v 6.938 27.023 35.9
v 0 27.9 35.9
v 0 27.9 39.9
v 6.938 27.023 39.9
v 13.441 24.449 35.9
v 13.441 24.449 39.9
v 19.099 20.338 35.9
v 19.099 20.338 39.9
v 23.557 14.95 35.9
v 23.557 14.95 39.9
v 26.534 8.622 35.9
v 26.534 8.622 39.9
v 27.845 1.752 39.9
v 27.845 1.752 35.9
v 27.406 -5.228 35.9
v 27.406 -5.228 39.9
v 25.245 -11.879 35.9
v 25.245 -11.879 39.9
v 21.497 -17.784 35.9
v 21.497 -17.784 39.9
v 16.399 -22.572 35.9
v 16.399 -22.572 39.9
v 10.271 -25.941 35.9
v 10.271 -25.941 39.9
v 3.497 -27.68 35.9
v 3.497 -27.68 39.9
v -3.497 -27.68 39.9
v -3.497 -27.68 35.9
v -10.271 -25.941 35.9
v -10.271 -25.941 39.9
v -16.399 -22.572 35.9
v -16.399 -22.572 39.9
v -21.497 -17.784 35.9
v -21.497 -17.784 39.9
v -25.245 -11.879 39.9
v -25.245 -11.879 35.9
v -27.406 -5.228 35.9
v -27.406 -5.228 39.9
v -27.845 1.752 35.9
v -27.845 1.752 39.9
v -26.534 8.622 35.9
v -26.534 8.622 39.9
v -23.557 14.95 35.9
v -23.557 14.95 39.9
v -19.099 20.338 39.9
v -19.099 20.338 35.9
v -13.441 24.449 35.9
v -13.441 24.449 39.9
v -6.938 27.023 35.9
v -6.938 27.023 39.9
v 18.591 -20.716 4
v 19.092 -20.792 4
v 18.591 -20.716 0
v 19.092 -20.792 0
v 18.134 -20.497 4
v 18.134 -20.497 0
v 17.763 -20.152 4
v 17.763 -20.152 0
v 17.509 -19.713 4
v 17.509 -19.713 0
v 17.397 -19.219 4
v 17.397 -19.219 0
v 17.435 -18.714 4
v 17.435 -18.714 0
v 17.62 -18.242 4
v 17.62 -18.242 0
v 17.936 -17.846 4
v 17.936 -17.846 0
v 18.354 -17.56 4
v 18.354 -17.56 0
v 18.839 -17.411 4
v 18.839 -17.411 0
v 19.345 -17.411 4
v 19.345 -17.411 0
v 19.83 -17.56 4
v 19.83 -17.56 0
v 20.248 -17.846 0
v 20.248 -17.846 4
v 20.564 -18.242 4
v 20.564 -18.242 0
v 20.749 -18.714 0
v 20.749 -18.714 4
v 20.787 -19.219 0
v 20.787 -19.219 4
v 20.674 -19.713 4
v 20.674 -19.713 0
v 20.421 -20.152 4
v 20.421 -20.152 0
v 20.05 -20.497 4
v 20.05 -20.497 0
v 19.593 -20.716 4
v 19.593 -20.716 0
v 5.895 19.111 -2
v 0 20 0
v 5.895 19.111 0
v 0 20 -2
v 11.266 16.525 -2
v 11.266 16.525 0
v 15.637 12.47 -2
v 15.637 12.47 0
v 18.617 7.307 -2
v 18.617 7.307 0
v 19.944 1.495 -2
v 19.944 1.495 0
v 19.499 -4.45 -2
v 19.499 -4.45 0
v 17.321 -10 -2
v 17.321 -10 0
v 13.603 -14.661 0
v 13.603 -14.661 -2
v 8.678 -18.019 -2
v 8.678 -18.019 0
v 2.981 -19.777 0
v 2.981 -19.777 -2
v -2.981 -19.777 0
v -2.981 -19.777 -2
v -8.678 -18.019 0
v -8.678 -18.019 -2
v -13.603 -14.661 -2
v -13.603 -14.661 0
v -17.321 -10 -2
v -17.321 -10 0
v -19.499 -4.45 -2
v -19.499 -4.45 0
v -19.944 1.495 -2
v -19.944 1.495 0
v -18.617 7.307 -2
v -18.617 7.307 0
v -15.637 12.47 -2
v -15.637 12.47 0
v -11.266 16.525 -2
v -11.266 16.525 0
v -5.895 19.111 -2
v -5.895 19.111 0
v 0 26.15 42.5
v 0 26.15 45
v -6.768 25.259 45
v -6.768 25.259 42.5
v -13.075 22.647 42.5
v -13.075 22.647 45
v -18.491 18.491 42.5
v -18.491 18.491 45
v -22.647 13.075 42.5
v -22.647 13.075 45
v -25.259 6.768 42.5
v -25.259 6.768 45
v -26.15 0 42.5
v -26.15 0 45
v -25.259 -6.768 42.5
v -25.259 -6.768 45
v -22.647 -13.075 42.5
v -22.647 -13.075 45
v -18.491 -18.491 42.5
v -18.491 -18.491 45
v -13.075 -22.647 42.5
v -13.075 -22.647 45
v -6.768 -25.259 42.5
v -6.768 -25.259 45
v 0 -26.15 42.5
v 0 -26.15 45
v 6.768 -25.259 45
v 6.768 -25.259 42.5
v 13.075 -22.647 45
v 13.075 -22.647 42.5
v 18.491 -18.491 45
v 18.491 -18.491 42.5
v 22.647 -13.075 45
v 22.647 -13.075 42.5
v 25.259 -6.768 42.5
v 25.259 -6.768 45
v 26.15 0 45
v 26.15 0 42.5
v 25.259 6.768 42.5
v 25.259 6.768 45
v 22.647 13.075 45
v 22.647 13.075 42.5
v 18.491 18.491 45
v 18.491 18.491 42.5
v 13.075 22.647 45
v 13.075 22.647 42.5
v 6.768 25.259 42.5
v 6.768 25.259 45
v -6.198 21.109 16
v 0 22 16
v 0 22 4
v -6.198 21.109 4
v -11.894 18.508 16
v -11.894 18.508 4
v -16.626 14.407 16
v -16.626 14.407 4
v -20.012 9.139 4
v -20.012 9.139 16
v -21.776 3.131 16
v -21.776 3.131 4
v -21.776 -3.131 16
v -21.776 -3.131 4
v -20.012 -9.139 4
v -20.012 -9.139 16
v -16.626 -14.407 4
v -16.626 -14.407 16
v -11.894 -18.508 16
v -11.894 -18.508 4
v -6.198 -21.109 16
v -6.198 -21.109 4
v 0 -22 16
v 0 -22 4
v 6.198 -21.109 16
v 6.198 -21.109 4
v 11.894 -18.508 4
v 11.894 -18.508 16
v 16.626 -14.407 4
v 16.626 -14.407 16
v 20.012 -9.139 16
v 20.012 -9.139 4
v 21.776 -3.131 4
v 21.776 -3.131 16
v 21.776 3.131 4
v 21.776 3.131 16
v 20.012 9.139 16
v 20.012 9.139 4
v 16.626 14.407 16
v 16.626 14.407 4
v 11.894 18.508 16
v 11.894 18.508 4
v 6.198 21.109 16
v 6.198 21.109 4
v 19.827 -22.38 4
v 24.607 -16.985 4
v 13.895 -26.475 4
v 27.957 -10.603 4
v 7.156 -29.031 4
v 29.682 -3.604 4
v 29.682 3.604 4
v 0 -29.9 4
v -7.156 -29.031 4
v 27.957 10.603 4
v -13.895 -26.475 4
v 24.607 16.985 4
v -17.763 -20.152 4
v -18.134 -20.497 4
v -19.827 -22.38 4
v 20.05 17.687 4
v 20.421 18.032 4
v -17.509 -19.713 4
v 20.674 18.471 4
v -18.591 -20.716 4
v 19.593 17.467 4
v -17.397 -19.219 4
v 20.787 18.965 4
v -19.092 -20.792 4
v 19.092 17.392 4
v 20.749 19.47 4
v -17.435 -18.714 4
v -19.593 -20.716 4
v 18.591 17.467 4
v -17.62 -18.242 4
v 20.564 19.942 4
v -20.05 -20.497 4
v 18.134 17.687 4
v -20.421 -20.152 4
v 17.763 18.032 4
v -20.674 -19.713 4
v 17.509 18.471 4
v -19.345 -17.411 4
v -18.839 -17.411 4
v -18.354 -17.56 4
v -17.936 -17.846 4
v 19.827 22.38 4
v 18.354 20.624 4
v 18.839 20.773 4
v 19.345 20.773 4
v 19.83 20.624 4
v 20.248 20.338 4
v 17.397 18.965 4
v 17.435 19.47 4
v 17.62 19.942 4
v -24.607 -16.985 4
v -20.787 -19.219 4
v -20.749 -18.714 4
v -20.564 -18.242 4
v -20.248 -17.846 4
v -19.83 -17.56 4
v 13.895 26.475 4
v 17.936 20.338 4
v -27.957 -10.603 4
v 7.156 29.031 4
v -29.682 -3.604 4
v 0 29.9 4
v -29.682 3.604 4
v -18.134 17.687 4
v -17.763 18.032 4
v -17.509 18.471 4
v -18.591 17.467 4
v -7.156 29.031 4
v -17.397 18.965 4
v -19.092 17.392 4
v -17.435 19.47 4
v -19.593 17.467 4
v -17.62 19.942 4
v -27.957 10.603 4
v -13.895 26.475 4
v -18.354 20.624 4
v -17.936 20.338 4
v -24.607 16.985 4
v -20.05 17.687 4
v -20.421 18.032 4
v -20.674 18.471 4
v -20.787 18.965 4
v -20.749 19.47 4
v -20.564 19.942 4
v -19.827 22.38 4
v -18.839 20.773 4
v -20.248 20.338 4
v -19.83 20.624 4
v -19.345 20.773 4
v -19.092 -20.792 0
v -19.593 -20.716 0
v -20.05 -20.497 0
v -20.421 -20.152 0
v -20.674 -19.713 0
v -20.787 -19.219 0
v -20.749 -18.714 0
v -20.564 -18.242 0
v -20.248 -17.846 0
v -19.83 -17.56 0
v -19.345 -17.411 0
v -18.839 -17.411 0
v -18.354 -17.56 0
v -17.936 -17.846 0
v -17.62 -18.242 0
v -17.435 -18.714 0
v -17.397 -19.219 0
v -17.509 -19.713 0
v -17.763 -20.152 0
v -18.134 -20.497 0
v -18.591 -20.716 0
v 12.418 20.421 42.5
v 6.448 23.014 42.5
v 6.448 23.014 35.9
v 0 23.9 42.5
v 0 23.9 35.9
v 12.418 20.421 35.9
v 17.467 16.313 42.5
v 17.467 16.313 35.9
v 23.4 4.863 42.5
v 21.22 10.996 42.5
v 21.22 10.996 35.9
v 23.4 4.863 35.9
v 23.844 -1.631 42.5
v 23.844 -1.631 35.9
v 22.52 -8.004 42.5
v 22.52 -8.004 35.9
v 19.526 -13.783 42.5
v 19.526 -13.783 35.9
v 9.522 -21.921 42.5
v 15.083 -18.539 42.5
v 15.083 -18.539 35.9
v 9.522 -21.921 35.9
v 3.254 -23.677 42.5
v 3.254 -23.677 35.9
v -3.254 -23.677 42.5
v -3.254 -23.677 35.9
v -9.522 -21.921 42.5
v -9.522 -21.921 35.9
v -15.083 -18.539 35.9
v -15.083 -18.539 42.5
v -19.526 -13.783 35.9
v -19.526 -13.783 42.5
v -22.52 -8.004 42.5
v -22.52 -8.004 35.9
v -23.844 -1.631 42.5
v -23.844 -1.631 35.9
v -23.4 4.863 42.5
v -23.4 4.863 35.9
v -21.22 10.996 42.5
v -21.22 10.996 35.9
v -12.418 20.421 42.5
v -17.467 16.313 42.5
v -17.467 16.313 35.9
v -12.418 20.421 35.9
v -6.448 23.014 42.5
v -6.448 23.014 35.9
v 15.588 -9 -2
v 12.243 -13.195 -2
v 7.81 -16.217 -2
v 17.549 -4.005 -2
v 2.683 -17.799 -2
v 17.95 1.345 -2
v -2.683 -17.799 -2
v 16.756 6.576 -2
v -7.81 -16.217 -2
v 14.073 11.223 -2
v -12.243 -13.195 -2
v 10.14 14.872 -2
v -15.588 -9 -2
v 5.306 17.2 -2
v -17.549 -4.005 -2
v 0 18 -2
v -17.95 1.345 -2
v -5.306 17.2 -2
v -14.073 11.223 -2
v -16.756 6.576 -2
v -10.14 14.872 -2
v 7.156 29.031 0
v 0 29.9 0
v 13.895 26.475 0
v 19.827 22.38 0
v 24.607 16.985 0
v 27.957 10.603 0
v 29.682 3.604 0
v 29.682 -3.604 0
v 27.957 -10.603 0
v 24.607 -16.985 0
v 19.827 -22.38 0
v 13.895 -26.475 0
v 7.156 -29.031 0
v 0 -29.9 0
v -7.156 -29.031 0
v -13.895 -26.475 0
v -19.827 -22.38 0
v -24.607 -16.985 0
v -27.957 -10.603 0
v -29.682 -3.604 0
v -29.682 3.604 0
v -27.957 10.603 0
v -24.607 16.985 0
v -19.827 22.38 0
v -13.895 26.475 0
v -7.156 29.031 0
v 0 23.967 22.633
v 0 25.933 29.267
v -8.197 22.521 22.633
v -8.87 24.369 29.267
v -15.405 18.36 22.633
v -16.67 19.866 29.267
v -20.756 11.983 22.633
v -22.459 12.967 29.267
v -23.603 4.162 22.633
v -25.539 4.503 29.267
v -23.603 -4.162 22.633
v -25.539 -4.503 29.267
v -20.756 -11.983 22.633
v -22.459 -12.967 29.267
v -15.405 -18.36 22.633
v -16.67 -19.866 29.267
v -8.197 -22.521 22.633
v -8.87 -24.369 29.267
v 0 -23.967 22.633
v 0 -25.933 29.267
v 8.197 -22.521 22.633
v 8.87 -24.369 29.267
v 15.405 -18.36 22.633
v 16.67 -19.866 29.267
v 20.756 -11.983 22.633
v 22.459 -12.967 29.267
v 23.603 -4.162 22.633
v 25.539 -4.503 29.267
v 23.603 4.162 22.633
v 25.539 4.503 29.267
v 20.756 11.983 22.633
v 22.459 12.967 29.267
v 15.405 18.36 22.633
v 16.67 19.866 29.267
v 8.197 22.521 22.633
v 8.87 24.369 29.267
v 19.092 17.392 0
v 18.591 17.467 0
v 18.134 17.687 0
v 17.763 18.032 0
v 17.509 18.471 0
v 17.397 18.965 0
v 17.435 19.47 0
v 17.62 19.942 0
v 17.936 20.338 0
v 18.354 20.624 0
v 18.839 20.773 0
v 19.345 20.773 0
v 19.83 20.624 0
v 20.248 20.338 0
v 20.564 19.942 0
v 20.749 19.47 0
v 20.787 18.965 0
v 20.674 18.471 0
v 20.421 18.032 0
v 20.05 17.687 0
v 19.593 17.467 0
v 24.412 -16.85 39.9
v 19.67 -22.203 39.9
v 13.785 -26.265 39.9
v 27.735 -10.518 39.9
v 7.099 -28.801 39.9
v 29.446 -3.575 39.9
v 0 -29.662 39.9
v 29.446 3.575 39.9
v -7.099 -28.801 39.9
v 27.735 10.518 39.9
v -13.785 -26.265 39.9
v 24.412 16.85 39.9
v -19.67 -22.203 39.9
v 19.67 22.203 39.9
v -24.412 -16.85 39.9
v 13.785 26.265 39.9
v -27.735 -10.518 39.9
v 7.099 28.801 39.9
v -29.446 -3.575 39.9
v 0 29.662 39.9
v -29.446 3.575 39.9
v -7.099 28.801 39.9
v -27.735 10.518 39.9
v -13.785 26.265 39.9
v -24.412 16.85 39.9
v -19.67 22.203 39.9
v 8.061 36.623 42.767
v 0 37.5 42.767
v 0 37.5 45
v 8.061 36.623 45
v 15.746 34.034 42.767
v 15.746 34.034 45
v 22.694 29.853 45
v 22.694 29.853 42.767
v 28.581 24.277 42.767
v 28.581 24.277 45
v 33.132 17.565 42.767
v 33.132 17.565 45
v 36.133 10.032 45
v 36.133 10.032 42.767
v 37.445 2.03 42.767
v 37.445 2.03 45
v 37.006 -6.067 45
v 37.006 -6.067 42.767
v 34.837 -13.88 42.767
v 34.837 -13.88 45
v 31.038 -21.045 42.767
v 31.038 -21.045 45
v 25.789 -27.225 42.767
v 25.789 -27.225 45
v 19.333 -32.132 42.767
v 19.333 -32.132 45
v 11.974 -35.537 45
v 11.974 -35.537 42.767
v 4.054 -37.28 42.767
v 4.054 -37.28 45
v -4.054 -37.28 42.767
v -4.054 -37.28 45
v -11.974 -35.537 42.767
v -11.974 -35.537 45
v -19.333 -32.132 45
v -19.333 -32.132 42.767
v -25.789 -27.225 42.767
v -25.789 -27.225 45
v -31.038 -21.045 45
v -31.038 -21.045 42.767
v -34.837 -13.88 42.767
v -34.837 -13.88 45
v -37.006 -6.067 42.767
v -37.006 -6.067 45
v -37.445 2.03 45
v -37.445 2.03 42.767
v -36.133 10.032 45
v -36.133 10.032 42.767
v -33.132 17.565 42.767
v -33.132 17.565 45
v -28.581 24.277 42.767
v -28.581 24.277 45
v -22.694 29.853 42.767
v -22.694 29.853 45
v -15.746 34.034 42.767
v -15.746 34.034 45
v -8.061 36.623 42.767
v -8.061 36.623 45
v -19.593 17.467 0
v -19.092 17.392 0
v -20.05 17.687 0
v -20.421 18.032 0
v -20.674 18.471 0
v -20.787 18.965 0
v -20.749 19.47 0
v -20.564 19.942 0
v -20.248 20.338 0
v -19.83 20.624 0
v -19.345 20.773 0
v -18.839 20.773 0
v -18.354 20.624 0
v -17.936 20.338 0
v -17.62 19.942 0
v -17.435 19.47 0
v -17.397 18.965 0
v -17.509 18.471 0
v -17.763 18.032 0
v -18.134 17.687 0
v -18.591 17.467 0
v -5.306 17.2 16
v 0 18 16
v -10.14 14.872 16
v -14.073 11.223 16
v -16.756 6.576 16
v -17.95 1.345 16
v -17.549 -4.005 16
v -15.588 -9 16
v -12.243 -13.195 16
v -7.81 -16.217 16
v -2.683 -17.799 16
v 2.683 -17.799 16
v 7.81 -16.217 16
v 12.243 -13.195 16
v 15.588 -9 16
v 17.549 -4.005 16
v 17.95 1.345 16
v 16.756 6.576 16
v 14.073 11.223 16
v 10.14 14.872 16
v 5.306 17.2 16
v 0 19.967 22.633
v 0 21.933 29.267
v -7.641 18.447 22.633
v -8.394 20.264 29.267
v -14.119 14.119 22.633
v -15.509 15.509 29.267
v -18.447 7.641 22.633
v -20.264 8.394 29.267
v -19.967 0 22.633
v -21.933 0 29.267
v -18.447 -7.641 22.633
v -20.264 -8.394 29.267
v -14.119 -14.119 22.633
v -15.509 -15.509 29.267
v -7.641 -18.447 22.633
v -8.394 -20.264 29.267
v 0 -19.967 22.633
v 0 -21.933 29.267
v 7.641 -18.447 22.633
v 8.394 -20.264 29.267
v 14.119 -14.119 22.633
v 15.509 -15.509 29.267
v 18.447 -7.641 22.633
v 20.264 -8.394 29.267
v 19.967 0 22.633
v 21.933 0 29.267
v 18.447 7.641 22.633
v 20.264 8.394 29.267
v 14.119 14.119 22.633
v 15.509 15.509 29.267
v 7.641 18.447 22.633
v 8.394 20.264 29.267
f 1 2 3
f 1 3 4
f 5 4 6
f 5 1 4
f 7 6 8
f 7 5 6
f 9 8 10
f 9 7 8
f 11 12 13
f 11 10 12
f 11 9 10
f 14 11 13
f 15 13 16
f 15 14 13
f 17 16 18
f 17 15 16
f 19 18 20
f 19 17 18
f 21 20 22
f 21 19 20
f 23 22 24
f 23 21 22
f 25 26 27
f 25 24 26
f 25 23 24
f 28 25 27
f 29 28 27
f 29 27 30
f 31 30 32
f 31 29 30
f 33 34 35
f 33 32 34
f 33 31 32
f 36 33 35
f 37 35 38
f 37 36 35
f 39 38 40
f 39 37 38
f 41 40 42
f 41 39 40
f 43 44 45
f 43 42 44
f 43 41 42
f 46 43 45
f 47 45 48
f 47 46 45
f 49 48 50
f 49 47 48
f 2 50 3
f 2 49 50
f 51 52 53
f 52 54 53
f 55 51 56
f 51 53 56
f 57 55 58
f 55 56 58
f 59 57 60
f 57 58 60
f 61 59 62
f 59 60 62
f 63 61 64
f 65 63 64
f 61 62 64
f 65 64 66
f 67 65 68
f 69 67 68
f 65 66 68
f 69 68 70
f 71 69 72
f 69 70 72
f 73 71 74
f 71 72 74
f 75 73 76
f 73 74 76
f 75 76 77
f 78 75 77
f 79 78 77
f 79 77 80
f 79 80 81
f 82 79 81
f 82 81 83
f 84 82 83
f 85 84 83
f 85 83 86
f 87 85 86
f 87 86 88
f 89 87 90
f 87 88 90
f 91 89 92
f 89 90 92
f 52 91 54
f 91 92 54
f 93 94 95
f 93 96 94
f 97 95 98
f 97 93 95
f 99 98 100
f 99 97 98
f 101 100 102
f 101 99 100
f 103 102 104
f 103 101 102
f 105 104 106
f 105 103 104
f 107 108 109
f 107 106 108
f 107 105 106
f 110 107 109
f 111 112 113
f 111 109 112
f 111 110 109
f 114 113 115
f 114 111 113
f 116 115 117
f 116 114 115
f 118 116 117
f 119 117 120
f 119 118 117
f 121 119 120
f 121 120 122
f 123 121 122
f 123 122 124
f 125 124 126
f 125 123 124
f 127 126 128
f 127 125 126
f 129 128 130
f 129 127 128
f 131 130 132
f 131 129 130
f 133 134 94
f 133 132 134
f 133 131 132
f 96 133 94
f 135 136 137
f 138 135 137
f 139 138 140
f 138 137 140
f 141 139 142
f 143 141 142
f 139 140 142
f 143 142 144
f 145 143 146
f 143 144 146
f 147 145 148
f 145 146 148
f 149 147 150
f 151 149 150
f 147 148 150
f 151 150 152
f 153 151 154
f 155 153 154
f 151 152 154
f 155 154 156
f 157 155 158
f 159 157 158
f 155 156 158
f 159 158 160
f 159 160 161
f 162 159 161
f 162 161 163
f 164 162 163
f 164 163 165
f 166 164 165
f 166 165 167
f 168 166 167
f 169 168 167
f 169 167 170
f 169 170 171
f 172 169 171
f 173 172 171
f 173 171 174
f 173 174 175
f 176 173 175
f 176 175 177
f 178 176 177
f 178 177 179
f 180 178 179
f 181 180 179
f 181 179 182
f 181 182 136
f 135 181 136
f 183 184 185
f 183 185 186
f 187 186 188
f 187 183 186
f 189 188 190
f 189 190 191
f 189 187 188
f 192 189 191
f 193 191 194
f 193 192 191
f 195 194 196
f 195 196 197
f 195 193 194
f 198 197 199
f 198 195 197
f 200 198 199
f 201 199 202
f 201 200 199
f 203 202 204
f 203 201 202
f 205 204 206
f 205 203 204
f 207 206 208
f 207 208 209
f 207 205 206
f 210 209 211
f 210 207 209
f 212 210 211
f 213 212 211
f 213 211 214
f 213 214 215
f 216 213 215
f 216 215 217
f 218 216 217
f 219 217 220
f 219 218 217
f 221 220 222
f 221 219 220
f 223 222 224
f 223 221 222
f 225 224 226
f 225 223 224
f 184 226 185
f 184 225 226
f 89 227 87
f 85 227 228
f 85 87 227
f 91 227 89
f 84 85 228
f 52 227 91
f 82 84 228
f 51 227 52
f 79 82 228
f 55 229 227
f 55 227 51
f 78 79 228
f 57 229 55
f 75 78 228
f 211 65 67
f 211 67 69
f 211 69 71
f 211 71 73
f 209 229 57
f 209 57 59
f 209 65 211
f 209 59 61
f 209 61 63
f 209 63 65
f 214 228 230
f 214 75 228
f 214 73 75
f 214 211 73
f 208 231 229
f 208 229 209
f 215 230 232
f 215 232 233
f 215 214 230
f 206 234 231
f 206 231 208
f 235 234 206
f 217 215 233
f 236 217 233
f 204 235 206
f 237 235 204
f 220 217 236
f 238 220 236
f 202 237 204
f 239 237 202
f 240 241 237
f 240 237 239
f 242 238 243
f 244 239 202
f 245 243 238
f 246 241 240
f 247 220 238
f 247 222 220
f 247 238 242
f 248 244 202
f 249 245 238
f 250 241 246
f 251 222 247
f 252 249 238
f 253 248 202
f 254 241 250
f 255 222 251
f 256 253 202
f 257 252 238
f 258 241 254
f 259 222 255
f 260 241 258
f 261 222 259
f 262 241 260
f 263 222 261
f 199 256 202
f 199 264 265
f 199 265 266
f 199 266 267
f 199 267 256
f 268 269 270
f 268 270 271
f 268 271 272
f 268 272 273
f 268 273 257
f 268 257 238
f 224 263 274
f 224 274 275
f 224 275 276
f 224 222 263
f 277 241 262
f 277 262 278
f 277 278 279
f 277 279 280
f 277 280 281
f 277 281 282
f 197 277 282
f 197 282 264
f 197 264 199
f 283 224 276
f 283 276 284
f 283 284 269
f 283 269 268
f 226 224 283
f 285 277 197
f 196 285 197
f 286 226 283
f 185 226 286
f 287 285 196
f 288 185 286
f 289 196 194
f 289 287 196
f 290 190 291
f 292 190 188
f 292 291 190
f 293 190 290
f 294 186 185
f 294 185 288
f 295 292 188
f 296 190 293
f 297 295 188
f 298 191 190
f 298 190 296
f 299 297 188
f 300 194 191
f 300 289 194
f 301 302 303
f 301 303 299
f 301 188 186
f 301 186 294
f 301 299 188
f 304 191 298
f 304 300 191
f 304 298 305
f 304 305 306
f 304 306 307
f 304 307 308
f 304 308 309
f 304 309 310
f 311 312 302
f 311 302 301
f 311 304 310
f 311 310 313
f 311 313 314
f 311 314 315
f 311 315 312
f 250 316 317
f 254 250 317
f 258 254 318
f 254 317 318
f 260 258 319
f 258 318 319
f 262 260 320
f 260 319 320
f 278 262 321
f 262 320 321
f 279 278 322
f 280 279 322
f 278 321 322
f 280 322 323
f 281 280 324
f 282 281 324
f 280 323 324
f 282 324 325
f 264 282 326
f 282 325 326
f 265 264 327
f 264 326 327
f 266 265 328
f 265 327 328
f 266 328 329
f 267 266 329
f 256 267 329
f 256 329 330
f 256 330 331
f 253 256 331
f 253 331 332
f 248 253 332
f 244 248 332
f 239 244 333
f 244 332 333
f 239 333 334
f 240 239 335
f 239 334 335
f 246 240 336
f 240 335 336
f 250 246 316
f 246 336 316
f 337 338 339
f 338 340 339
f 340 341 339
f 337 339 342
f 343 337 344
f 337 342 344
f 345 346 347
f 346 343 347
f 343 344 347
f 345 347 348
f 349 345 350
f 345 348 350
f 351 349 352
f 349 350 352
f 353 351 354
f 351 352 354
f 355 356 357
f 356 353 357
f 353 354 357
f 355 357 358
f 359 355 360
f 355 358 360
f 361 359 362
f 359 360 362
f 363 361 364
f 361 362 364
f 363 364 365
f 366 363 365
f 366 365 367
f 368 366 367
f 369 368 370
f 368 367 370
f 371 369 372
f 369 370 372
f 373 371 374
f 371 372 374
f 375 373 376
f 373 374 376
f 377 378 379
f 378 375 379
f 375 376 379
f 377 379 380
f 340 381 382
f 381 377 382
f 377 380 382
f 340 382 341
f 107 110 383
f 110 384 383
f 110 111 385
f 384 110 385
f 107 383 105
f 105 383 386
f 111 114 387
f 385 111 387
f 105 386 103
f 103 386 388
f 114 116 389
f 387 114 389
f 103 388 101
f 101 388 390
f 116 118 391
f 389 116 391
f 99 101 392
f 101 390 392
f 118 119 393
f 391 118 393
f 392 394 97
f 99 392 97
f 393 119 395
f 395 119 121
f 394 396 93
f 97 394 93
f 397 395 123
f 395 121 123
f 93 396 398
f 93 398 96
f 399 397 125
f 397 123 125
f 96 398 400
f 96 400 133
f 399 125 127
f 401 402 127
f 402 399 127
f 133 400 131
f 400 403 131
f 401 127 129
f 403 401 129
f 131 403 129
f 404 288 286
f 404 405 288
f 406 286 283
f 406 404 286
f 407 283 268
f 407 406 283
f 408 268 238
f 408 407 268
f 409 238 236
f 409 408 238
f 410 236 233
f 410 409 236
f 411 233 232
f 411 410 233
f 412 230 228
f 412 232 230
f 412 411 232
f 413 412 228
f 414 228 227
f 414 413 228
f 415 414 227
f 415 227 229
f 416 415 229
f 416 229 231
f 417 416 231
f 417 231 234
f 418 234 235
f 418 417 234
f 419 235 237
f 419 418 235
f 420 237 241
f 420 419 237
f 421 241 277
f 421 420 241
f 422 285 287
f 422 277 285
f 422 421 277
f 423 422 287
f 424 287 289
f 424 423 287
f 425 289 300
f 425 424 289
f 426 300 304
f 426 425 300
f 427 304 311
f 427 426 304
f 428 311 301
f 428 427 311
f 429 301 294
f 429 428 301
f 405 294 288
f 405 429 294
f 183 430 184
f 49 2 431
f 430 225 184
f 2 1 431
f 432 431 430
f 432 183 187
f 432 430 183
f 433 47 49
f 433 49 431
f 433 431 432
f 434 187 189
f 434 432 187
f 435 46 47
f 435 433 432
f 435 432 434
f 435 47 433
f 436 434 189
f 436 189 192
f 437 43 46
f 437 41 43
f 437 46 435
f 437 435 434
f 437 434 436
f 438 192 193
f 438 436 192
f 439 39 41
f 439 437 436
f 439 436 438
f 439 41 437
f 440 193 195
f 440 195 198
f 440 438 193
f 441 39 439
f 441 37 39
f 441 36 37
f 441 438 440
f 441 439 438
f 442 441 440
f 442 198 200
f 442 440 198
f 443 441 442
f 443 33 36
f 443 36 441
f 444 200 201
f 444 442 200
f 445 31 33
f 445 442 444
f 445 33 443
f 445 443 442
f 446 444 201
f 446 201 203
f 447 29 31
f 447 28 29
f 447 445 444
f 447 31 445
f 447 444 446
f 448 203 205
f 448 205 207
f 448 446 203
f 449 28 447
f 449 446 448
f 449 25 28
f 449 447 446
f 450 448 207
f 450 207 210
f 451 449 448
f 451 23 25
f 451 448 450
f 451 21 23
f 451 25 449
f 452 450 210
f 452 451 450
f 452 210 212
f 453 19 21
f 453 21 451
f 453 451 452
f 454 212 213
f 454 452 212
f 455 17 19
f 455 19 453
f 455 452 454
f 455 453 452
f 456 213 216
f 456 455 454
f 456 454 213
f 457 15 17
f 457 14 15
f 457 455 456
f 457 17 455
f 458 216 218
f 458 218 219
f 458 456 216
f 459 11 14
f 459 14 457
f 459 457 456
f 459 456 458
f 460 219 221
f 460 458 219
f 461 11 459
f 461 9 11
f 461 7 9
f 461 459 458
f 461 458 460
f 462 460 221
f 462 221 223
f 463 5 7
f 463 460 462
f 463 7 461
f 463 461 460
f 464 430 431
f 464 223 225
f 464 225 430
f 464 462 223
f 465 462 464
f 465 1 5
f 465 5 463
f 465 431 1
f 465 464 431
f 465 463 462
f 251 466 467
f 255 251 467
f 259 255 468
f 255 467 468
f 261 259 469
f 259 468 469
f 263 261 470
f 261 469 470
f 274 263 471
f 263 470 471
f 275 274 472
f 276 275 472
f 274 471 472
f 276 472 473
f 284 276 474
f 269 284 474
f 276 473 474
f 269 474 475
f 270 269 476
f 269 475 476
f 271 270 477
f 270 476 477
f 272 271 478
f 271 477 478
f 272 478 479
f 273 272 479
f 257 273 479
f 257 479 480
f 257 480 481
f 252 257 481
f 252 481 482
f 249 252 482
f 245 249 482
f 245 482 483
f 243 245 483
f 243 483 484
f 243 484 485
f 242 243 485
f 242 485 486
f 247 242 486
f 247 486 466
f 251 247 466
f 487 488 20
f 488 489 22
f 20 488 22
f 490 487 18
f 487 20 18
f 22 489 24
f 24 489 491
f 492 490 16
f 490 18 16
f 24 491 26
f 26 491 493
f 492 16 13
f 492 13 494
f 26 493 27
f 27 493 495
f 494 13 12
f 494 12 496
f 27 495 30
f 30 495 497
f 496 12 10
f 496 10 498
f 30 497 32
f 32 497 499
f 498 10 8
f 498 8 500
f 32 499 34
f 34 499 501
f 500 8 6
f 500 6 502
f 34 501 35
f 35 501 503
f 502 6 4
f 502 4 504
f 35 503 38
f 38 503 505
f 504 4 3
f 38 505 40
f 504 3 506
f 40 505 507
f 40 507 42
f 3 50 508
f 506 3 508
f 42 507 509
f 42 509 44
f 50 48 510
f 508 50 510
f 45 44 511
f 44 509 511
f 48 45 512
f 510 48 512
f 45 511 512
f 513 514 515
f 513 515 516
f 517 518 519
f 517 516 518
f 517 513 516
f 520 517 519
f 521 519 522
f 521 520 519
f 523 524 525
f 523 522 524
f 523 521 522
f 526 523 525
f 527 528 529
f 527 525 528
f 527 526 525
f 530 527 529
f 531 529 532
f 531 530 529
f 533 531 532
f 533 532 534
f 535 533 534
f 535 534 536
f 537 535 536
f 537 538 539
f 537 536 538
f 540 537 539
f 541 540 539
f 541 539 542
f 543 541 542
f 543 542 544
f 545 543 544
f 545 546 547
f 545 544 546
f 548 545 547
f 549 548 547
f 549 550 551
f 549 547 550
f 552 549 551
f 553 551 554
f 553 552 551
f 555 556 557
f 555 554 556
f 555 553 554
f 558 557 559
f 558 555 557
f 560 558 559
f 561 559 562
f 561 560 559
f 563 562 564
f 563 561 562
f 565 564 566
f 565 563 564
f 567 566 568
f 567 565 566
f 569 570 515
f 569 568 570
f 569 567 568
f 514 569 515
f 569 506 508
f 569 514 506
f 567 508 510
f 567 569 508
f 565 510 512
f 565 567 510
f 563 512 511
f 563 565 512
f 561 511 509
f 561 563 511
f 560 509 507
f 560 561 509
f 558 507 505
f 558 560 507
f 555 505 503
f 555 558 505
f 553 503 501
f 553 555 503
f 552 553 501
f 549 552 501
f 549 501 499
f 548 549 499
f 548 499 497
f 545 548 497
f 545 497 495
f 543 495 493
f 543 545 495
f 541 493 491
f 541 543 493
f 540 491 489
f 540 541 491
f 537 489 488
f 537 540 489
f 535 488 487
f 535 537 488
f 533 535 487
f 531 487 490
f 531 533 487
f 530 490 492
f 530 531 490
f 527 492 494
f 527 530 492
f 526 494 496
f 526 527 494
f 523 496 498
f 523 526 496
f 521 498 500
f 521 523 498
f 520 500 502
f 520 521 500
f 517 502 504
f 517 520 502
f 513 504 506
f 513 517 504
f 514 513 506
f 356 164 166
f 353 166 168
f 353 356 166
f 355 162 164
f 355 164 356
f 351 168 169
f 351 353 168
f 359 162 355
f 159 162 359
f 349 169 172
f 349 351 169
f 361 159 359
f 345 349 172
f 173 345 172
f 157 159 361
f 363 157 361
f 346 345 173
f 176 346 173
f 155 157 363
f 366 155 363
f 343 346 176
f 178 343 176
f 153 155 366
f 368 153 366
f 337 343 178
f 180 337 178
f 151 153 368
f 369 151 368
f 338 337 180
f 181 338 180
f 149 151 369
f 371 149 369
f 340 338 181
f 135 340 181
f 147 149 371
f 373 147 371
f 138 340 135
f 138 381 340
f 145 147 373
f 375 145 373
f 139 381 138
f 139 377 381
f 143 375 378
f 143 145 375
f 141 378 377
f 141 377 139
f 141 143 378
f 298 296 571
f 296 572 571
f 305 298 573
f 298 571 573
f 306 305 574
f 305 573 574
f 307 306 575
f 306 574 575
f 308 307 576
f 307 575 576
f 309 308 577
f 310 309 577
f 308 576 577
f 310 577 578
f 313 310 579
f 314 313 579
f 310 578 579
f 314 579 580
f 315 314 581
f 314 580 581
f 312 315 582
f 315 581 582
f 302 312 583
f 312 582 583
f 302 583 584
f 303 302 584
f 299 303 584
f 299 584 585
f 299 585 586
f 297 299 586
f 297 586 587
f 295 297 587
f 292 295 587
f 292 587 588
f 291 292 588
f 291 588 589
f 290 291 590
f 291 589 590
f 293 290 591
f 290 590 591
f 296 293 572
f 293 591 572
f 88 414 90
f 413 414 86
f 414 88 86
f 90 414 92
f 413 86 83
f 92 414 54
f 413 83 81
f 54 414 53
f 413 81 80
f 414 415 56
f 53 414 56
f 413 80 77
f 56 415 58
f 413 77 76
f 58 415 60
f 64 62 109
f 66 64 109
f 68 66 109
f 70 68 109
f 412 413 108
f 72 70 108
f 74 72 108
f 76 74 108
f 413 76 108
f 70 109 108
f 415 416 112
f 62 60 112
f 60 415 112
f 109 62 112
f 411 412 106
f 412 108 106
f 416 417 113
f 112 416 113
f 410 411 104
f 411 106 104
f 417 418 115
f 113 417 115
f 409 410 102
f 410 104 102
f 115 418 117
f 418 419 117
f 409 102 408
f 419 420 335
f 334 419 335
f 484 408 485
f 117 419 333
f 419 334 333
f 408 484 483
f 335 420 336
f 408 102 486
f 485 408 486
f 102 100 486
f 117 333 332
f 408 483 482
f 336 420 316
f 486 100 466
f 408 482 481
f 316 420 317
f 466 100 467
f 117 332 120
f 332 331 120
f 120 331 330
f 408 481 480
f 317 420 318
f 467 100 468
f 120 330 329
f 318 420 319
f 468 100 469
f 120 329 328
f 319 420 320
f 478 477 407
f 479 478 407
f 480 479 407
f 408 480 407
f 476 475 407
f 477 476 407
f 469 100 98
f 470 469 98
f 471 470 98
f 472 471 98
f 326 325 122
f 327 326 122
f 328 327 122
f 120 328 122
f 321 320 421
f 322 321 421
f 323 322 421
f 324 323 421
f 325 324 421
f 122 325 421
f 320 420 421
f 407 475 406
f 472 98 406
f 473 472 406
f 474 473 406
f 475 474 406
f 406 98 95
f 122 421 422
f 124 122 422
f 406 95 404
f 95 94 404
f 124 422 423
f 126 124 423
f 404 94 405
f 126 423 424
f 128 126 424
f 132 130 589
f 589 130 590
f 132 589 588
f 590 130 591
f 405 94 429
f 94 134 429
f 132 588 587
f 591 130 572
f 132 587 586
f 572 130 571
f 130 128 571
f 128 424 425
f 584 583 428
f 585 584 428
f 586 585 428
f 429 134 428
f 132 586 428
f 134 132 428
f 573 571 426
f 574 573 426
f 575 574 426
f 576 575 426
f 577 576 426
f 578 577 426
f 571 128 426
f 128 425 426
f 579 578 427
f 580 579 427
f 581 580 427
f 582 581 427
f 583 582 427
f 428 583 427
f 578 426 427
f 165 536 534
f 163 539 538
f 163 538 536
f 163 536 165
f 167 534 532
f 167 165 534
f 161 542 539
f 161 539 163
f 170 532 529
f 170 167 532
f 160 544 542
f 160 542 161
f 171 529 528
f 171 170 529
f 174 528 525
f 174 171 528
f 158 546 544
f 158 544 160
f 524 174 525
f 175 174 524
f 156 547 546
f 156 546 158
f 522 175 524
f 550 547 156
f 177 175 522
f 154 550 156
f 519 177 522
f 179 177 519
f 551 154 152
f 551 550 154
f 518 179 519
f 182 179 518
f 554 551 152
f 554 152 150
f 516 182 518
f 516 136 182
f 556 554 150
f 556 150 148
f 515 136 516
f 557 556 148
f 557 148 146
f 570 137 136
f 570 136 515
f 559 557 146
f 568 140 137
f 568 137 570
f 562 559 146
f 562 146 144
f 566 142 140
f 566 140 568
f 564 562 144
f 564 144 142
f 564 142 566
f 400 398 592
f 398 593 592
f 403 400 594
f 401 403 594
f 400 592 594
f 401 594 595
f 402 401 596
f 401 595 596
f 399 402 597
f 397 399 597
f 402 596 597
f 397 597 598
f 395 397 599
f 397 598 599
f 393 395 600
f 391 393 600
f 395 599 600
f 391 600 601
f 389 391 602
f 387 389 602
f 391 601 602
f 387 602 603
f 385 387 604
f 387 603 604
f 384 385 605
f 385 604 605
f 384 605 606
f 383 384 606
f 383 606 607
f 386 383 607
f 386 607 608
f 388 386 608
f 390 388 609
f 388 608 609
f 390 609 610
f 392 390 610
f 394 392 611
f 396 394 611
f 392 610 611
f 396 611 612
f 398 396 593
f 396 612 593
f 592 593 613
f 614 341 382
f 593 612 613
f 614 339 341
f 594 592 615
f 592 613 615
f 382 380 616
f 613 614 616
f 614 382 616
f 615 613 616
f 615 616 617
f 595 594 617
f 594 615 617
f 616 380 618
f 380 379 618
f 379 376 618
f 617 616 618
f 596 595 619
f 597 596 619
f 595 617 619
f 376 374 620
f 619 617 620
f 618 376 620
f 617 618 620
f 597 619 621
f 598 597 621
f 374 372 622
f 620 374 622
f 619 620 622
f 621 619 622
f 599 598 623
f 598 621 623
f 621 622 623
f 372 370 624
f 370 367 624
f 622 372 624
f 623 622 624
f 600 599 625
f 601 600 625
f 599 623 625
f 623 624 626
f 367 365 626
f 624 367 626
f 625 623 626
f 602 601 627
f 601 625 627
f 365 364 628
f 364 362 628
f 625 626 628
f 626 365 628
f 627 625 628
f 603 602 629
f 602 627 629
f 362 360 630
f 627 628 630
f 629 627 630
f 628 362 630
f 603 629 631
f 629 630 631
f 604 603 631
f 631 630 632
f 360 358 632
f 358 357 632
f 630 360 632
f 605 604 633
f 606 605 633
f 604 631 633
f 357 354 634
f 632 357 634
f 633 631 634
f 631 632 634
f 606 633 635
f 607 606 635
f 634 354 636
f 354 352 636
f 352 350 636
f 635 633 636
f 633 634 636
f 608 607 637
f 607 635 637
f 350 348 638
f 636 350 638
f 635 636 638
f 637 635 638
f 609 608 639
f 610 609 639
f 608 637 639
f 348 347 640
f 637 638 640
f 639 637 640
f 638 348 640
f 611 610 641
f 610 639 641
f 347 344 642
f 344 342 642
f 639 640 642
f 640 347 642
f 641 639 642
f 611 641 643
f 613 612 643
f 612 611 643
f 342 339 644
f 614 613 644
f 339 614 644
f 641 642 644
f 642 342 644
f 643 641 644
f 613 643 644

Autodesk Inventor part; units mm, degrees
ref_plane "YZ Plane" through (0, 0, 0) normal (1, 0, 0) x (0, 1, 0)
ref_plane "XZ Plane" through (0, 0, 0) normal (0, 1, 0) x (-1, 0, 0)
ref_plane "XY Plane" through (0, 0, 0) normal (0, 0, 1) x (1, 0, 0)
sketch "Sketch1" plane through (0, 0, 0) normal (1, 0, 0) x (0, 1, 0)
  line L0 (0, 0) -> (0, 55.5774) construction
  line L1 (18, -2) -> (18, 16)
  line L2 (23.9, 42.5) -> (26.15, 42.5)
  line L3 (26.15, 42.5) -> (26.15, 45)
  line L4 (26.15, 45) -> (37.5, 45)
  line L5 (37.5, 45) -> (37.5, 42.767)
  line L6 (37.5, 42.767) -> (29.6625, 39.9)
  line L7 (27.9, 35.9) -> (22, 16)
  line L8 (22, 4) -> (29.9, 4)
  line L9 (29.9, 4) -> (29.9, 0)
  line L10 (29.9, 0) -> (20, 0)
  line L11 (20, 0) -> (20, -2)
  line L12 (20, -2) -> (18, -2)
  line L13 (22, 4) -> (22, 16)
  line L14 (29.6625, 39.9) -> (27.9, 39.9)
  line L15 (27.9, 39.9) -> (27.9, 35.9)
  line L16 (23.9, 42.5) -> (23.9, 35.9)
  line L17 (18, 16) -> (23.9, 35.9)
  dimension "d0" = 40
  dimension "d1" = 2
  dimension "d2" = 2
  dimension "d4" = 59.8
  dimension "d5" = 4
  dimension "d7" = 12
  dimension "d8" = 4
  dimension "d9" = 75
  dimension "d10" = 2.233
  dimension "d11" = 52.3
  dimension "d12" = 47.8
  dimension "d13" = 59.325
  dimension "d14" = 5.1
  dimension "d15" = 2.5
  dimension "d16" = 4
  dimension "d17" = 45
revolve "Revolution1" add sketch "Sketch1" angle 360 about axis through (0, 0, 0) along (0, 0, 1)
sketch "Sketch2" plane through (0, 0, 4) normal (0, 0, 1) x (1, 0, 0)
  line L0 (-19.0919, 19.0919) -> (19.0919, 19.0919)
  line L1 (19.0919, 19.0919) -> (19.0919, -19.0919)
  line L2 (19.0919, -19.0919) -> (-19.0919, -19.0919)
  line L3 (-19.0919, -19.0919) -> (-19.0919, 19.0919)
  line L4 (-19.0919, 19.0919) -> (19.0919, -19.0919) construction
  line L5 (19.0919, 19.0919) -> (-19.0919, -19.0919) construction
  point P0 (0, 0)
  dimension "d19" = 54
hole "Hole1" at (-19.0919, 19.0919, 4) at (19.0919, 19.0919, 4) at (-19.0919, -19.0919, 4) at (19.0919, -19.0919, 4) direction (0, 0, -1) diameter 3.4 end through all clearance for "Countersunk Flat Head Screw DIN EN ISO 2009" size "M3" standard "DIN"
properties part number "014" material "Aluminum 6061"
